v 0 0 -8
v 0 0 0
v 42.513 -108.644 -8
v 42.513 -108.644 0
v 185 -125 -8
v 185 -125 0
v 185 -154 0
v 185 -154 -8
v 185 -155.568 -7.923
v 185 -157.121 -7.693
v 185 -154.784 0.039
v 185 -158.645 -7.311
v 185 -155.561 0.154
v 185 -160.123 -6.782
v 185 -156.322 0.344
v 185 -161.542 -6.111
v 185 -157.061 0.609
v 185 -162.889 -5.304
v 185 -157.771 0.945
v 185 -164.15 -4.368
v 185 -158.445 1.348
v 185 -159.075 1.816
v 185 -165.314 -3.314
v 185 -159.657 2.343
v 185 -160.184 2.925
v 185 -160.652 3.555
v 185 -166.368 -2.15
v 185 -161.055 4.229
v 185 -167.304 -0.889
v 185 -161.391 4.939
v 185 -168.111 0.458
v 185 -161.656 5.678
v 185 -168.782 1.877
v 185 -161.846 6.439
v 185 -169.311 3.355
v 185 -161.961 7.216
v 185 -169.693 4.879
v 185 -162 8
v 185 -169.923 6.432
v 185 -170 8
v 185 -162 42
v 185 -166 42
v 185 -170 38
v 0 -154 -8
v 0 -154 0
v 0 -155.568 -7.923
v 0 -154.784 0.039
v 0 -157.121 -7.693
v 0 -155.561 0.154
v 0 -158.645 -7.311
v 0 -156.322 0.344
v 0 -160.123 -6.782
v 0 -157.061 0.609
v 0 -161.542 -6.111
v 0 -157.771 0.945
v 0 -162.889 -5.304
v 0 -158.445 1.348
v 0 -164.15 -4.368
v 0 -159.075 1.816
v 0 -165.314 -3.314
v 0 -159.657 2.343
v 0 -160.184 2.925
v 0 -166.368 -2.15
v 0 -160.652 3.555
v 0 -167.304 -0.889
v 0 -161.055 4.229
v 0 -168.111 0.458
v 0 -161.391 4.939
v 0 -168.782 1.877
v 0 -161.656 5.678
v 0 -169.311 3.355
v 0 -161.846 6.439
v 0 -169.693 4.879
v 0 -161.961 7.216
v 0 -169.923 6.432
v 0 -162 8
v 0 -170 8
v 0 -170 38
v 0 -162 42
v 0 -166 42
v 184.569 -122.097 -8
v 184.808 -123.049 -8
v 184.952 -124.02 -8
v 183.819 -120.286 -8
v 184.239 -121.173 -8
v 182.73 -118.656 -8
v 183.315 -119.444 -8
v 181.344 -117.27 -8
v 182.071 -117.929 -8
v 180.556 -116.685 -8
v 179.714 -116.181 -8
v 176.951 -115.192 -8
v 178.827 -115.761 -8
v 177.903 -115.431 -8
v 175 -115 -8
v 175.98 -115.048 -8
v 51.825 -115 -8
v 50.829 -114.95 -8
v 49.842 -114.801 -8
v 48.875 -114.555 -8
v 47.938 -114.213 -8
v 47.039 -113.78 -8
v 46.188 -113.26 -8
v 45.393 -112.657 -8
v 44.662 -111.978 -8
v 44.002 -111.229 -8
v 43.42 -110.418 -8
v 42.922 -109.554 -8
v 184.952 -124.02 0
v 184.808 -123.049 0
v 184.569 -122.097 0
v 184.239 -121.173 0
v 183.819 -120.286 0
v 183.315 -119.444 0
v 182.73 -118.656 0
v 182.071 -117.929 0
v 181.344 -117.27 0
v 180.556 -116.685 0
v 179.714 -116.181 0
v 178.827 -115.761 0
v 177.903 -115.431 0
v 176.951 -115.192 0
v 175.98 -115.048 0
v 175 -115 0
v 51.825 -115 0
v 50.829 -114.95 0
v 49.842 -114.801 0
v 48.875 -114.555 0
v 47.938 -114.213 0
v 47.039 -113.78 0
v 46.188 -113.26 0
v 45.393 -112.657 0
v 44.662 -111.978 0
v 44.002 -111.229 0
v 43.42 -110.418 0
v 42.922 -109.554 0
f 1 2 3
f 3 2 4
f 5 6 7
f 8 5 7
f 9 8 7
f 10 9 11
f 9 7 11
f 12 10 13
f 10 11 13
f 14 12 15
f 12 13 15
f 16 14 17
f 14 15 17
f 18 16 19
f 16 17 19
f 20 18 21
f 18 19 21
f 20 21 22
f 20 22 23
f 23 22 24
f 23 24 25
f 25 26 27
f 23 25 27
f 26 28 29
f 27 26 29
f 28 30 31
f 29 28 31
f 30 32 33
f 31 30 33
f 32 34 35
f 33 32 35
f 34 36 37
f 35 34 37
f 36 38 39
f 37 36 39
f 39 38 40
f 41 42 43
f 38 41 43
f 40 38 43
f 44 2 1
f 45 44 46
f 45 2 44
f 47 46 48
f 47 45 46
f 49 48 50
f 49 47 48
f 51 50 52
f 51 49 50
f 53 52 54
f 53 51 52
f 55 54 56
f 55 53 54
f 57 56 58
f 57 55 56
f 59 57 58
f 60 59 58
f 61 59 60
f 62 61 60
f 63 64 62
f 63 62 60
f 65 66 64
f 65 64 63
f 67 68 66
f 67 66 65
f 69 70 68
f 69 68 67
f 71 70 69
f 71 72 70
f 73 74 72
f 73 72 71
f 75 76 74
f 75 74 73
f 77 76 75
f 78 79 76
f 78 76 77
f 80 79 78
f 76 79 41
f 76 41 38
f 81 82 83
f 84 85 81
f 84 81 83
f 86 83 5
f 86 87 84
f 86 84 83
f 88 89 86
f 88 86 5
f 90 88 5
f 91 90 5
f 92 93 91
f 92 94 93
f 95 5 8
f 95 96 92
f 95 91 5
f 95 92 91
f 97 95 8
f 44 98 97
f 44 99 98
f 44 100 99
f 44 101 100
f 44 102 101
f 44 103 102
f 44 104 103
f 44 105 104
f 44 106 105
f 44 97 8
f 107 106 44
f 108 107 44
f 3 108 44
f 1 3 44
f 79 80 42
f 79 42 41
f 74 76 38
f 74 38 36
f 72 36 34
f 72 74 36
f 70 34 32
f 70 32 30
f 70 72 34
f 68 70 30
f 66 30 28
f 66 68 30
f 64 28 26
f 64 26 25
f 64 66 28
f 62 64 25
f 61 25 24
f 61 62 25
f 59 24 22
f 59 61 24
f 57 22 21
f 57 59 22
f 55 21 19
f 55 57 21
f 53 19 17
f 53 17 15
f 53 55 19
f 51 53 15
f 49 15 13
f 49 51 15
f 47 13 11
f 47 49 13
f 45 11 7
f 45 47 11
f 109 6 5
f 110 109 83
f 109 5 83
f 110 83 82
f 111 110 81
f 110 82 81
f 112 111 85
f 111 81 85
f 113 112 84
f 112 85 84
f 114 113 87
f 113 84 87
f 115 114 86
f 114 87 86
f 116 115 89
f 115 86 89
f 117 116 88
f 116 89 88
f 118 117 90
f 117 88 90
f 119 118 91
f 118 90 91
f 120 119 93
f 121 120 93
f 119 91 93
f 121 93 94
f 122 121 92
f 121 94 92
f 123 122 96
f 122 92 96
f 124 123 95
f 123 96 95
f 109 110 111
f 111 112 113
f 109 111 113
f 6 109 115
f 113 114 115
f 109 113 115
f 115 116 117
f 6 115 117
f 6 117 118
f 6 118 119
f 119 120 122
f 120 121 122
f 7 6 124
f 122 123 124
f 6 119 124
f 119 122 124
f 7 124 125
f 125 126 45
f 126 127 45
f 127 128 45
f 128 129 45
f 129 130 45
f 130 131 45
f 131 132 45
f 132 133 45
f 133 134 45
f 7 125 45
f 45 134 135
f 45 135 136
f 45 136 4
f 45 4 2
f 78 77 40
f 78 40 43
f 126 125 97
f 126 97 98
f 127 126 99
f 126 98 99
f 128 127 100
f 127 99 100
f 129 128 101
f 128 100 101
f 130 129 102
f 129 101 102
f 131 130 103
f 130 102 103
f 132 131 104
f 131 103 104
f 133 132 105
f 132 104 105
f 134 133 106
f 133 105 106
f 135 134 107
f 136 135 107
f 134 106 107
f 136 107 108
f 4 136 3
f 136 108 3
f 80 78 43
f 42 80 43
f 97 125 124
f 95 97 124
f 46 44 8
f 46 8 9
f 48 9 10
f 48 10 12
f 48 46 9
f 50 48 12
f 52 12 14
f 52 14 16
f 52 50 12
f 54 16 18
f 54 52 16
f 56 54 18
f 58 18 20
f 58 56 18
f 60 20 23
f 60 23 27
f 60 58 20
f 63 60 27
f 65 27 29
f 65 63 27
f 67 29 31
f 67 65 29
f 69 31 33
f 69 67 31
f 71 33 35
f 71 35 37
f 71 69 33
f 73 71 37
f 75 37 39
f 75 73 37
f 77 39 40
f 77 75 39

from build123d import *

# Parameters (mm, degrees)
SM_BASE_FLANGE_1_DEPTH           = 8
SM_EDGE_FLANGE_1_STRIP_W         = 48
SM_EDGE_FLANGE_1_STRIP_H         = 8
SM_EDGE_FLANGE_1_STRIP_CUT_DEPTH = 185
SM_EDGE_FLANGE_1_DEPTH           = 185
FILLET_1_R                       = 10
CHAMFER_1_SIZE                   = 4


# Sheet-metal steps are written as plain solids
with BuildPart() as part:
    # Sketch 1 → 基体-法兰1 (new body)
    with BuildSketch(Plane.XY):
        Polygon((0, 0), (45, -115), (185, -115), (185, -170), (0, -170), align=None)
    extrude(amount=-SM_BASE_FLANGE_1_DEPTH)

    # 边线-法兰1 strip (across the edge) → 边线-法兰1 strip cut (cut)
    with BuildSketch(Plane(origin=(0, -170, 0), x_dir=(0, 1, 0), z_dir=(1, 0, 0))):
        with Locations((-8, -4)):
            Rectangle(SM_EDGE_FLANGE_1_STRIP_W, SM_EDGE_FLANGE_1_STRIP_H)
    extrude(amount=SM_EDGE_FLANGE_1_STRIP_CUT_DEPTH, mode=Mode.SUBTRACT)

    # 边线-法兰1 section (across the edge) → 边线-法兰1 (add)
    with BuildSketch(Plane(origin=(0, -170, 0), x_dir=(0, 1, 0), z_dir=(1, 0, 0))):
        with BuildLine():
            Line((0, 8), (0, 42))
            Line((0, 42), (8, 42))
            Line((8, 42), (8, 8))
            ThreePointArc((8, 8), (10.343145751, 2.343145751), (16, 0))
            Line((16, 0), (16, -8))
            ThreePointArc((16, -8), (4.686291501, -3.313708499), (0, 8))
        make_face()
    extrude(amount=SM_EDGE_FLANGE_1_DEPTH)

    # 圆角1
    fillet_1_edges = [part.edges().sort_by_distance(p)[0] for p in [
        (45, -115, -4),
        (185, -115, -4),
    ]]
    fillet(fillet_1_edges, radius=FILLET_1_R)

    # 倒角1
    chamfer_1_edges = [part.edges().sort_by_distance(p)[0] for p in [
        (92.5, -170, 42),
    ]]
    chamfer(chamfer_1_edges, length=CHAMFER_1_SIZE)


solid = part.part
